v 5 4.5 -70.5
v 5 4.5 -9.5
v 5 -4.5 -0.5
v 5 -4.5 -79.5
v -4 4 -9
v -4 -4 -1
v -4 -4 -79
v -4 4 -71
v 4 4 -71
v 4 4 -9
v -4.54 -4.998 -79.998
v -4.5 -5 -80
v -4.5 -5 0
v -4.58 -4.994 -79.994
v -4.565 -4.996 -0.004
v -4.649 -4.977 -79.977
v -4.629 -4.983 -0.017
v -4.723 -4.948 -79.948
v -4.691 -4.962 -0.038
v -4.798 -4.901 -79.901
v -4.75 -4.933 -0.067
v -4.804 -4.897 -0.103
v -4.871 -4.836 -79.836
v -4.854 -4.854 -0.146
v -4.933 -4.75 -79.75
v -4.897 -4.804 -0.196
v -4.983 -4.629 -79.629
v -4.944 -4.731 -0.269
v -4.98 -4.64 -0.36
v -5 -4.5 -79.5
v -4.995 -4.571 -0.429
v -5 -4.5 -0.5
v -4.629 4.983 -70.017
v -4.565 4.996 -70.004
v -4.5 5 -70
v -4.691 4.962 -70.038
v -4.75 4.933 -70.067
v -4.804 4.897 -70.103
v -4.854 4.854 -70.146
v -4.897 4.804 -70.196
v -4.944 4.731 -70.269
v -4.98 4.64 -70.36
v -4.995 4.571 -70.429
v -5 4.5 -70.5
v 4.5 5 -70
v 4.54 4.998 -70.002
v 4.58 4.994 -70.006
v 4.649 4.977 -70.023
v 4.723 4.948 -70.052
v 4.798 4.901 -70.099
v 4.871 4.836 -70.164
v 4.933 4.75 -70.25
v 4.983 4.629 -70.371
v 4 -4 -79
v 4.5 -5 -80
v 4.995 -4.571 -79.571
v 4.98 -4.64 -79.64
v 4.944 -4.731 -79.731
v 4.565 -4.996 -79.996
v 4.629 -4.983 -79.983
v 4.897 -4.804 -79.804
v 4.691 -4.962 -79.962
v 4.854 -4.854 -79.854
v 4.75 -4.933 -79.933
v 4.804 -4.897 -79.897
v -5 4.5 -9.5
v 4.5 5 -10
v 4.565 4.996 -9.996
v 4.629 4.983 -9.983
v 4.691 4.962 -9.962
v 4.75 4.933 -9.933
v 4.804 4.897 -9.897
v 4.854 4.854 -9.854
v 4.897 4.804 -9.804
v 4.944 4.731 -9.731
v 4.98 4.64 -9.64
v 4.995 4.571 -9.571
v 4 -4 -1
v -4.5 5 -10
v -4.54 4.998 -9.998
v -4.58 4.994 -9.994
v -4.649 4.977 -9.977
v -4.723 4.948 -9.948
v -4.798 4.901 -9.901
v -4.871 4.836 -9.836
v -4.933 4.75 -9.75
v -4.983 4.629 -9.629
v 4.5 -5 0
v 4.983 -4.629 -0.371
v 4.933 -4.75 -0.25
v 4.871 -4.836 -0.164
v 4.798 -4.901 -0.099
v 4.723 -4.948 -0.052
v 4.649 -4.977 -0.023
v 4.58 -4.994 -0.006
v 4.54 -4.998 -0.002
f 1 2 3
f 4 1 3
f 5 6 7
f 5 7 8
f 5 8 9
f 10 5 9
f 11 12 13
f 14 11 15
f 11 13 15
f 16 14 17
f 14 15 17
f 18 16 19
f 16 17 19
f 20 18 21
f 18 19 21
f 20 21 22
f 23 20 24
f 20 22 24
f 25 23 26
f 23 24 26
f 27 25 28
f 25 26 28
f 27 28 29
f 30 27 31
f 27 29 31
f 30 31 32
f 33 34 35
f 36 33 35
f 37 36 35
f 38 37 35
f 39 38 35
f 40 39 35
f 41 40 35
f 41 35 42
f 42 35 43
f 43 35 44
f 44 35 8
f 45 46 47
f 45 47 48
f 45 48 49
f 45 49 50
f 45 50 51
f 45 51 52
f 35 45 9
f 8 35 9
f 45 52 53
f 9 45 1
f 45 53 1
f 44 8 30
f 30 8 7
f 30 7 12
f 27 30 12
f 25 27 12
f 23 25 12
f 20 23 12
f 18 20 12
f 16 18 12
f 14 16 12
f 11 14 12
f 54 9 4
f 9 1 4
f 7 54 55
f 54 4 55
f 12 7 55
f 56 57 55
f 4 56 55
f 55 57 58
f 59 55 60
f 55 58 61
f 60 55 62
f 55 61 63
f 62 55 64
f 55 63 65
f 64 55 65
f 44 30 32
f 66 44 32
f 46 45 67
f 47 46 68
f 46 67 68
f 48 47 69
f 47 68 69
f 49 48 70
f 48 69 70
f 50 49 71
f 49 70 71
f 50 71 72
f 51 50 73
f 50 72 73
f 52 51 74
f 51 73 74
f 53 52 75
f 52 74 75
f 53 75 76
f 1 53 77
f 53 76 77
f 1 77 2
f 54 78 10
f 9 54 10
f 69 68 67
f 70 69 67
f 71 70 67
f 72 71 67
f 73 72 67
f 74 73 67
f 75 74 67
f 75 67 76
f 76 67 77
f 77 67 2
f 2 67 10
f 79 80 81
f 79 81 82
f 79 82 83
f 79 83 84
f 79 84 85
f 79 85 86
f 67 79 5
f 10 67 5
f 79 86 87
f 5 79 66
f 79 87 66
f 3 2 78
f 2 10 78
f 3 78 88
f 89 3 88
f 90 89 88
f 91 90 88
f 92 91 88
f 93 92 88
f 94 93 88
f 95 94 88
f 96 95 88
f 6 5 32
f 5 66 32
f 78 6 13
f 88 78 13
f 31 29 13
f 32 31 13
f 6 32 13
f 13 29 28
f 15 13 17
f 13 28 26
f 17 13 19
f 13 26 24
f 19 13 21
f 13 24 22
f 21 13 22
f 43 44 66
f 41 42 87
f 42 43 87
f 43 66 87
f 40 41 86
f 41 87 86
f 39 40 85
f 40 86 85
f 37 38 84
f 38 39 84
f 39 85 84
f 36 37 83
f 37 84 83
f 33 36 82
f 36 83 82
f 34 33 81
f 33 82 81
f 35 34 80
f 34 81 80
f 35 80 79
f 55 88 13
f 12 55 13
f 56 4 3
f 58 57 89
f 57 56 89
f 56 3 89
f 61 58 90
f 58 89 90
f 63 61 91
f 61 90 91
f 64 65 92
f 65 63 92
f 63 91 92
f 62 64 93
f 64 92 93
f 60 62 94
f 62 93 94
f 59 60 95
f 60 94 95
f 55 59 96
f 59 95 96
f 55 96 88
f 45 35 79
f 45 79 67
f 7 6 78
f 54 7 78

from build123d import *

# Parameters (mm, degrees)
SKETCH_11_W          = 8
SKETCH_11_H          = 8
MEMBER_10_10_1_DEPTH = 80
CUT_EXTRUDE_1_DEPTH  = 5


with BuildPart() as part:
    # 草图11 → Member 10_10_1 (new body)
    with BuildSketch(Plane.YX):
        with BuildLine():
            Line((-4.5, -5), (4.5, -5))
            ThreePointArc((4.5, -5), (4.853553391, -4.853553391), (5, -4.5))
            Line((5, -4.5), (5, 4.5))
            ThreePointArc((5, 4.5), (4.853553391, 4.853553391), (4.5, 5))
            Line((4.5, 5), (-4.5, 5))
            ThreePointArc((-4.5, 5), (-4.853553391, 4.853553391), (-5, 4.5))
            Line((-5, 4.5), (-5, -4.5))
            ThreePointArc((-5, -4.5), (-4.853553391, -4.853553391), (-4.5, -5))
        make_face()
        Rectangle(SKETCH_11_W, SKETCH_11_H, mode=Mode.SUBTRACT)
    extrude(amount=MEMBER_10_10_1_DEPTH)

    # 草图12 → 切除-拉伸1 (cut, symmetric)
    with BuildSketch(Plane(origin=(0, 0, 0), x_dir=(0, 0, -1), z_dir=(1, 0, 0))):
        Polygon((0, -5), (0, 5), (10, 5), align=None)
        Polygon((80, -5), (80, 5), (70, 5), align=None)
    extrude(amount=CUT_EXTRUDE_1_DEPTH, both=True, mode=Mode.SUBTRACT)


solid = part.part
